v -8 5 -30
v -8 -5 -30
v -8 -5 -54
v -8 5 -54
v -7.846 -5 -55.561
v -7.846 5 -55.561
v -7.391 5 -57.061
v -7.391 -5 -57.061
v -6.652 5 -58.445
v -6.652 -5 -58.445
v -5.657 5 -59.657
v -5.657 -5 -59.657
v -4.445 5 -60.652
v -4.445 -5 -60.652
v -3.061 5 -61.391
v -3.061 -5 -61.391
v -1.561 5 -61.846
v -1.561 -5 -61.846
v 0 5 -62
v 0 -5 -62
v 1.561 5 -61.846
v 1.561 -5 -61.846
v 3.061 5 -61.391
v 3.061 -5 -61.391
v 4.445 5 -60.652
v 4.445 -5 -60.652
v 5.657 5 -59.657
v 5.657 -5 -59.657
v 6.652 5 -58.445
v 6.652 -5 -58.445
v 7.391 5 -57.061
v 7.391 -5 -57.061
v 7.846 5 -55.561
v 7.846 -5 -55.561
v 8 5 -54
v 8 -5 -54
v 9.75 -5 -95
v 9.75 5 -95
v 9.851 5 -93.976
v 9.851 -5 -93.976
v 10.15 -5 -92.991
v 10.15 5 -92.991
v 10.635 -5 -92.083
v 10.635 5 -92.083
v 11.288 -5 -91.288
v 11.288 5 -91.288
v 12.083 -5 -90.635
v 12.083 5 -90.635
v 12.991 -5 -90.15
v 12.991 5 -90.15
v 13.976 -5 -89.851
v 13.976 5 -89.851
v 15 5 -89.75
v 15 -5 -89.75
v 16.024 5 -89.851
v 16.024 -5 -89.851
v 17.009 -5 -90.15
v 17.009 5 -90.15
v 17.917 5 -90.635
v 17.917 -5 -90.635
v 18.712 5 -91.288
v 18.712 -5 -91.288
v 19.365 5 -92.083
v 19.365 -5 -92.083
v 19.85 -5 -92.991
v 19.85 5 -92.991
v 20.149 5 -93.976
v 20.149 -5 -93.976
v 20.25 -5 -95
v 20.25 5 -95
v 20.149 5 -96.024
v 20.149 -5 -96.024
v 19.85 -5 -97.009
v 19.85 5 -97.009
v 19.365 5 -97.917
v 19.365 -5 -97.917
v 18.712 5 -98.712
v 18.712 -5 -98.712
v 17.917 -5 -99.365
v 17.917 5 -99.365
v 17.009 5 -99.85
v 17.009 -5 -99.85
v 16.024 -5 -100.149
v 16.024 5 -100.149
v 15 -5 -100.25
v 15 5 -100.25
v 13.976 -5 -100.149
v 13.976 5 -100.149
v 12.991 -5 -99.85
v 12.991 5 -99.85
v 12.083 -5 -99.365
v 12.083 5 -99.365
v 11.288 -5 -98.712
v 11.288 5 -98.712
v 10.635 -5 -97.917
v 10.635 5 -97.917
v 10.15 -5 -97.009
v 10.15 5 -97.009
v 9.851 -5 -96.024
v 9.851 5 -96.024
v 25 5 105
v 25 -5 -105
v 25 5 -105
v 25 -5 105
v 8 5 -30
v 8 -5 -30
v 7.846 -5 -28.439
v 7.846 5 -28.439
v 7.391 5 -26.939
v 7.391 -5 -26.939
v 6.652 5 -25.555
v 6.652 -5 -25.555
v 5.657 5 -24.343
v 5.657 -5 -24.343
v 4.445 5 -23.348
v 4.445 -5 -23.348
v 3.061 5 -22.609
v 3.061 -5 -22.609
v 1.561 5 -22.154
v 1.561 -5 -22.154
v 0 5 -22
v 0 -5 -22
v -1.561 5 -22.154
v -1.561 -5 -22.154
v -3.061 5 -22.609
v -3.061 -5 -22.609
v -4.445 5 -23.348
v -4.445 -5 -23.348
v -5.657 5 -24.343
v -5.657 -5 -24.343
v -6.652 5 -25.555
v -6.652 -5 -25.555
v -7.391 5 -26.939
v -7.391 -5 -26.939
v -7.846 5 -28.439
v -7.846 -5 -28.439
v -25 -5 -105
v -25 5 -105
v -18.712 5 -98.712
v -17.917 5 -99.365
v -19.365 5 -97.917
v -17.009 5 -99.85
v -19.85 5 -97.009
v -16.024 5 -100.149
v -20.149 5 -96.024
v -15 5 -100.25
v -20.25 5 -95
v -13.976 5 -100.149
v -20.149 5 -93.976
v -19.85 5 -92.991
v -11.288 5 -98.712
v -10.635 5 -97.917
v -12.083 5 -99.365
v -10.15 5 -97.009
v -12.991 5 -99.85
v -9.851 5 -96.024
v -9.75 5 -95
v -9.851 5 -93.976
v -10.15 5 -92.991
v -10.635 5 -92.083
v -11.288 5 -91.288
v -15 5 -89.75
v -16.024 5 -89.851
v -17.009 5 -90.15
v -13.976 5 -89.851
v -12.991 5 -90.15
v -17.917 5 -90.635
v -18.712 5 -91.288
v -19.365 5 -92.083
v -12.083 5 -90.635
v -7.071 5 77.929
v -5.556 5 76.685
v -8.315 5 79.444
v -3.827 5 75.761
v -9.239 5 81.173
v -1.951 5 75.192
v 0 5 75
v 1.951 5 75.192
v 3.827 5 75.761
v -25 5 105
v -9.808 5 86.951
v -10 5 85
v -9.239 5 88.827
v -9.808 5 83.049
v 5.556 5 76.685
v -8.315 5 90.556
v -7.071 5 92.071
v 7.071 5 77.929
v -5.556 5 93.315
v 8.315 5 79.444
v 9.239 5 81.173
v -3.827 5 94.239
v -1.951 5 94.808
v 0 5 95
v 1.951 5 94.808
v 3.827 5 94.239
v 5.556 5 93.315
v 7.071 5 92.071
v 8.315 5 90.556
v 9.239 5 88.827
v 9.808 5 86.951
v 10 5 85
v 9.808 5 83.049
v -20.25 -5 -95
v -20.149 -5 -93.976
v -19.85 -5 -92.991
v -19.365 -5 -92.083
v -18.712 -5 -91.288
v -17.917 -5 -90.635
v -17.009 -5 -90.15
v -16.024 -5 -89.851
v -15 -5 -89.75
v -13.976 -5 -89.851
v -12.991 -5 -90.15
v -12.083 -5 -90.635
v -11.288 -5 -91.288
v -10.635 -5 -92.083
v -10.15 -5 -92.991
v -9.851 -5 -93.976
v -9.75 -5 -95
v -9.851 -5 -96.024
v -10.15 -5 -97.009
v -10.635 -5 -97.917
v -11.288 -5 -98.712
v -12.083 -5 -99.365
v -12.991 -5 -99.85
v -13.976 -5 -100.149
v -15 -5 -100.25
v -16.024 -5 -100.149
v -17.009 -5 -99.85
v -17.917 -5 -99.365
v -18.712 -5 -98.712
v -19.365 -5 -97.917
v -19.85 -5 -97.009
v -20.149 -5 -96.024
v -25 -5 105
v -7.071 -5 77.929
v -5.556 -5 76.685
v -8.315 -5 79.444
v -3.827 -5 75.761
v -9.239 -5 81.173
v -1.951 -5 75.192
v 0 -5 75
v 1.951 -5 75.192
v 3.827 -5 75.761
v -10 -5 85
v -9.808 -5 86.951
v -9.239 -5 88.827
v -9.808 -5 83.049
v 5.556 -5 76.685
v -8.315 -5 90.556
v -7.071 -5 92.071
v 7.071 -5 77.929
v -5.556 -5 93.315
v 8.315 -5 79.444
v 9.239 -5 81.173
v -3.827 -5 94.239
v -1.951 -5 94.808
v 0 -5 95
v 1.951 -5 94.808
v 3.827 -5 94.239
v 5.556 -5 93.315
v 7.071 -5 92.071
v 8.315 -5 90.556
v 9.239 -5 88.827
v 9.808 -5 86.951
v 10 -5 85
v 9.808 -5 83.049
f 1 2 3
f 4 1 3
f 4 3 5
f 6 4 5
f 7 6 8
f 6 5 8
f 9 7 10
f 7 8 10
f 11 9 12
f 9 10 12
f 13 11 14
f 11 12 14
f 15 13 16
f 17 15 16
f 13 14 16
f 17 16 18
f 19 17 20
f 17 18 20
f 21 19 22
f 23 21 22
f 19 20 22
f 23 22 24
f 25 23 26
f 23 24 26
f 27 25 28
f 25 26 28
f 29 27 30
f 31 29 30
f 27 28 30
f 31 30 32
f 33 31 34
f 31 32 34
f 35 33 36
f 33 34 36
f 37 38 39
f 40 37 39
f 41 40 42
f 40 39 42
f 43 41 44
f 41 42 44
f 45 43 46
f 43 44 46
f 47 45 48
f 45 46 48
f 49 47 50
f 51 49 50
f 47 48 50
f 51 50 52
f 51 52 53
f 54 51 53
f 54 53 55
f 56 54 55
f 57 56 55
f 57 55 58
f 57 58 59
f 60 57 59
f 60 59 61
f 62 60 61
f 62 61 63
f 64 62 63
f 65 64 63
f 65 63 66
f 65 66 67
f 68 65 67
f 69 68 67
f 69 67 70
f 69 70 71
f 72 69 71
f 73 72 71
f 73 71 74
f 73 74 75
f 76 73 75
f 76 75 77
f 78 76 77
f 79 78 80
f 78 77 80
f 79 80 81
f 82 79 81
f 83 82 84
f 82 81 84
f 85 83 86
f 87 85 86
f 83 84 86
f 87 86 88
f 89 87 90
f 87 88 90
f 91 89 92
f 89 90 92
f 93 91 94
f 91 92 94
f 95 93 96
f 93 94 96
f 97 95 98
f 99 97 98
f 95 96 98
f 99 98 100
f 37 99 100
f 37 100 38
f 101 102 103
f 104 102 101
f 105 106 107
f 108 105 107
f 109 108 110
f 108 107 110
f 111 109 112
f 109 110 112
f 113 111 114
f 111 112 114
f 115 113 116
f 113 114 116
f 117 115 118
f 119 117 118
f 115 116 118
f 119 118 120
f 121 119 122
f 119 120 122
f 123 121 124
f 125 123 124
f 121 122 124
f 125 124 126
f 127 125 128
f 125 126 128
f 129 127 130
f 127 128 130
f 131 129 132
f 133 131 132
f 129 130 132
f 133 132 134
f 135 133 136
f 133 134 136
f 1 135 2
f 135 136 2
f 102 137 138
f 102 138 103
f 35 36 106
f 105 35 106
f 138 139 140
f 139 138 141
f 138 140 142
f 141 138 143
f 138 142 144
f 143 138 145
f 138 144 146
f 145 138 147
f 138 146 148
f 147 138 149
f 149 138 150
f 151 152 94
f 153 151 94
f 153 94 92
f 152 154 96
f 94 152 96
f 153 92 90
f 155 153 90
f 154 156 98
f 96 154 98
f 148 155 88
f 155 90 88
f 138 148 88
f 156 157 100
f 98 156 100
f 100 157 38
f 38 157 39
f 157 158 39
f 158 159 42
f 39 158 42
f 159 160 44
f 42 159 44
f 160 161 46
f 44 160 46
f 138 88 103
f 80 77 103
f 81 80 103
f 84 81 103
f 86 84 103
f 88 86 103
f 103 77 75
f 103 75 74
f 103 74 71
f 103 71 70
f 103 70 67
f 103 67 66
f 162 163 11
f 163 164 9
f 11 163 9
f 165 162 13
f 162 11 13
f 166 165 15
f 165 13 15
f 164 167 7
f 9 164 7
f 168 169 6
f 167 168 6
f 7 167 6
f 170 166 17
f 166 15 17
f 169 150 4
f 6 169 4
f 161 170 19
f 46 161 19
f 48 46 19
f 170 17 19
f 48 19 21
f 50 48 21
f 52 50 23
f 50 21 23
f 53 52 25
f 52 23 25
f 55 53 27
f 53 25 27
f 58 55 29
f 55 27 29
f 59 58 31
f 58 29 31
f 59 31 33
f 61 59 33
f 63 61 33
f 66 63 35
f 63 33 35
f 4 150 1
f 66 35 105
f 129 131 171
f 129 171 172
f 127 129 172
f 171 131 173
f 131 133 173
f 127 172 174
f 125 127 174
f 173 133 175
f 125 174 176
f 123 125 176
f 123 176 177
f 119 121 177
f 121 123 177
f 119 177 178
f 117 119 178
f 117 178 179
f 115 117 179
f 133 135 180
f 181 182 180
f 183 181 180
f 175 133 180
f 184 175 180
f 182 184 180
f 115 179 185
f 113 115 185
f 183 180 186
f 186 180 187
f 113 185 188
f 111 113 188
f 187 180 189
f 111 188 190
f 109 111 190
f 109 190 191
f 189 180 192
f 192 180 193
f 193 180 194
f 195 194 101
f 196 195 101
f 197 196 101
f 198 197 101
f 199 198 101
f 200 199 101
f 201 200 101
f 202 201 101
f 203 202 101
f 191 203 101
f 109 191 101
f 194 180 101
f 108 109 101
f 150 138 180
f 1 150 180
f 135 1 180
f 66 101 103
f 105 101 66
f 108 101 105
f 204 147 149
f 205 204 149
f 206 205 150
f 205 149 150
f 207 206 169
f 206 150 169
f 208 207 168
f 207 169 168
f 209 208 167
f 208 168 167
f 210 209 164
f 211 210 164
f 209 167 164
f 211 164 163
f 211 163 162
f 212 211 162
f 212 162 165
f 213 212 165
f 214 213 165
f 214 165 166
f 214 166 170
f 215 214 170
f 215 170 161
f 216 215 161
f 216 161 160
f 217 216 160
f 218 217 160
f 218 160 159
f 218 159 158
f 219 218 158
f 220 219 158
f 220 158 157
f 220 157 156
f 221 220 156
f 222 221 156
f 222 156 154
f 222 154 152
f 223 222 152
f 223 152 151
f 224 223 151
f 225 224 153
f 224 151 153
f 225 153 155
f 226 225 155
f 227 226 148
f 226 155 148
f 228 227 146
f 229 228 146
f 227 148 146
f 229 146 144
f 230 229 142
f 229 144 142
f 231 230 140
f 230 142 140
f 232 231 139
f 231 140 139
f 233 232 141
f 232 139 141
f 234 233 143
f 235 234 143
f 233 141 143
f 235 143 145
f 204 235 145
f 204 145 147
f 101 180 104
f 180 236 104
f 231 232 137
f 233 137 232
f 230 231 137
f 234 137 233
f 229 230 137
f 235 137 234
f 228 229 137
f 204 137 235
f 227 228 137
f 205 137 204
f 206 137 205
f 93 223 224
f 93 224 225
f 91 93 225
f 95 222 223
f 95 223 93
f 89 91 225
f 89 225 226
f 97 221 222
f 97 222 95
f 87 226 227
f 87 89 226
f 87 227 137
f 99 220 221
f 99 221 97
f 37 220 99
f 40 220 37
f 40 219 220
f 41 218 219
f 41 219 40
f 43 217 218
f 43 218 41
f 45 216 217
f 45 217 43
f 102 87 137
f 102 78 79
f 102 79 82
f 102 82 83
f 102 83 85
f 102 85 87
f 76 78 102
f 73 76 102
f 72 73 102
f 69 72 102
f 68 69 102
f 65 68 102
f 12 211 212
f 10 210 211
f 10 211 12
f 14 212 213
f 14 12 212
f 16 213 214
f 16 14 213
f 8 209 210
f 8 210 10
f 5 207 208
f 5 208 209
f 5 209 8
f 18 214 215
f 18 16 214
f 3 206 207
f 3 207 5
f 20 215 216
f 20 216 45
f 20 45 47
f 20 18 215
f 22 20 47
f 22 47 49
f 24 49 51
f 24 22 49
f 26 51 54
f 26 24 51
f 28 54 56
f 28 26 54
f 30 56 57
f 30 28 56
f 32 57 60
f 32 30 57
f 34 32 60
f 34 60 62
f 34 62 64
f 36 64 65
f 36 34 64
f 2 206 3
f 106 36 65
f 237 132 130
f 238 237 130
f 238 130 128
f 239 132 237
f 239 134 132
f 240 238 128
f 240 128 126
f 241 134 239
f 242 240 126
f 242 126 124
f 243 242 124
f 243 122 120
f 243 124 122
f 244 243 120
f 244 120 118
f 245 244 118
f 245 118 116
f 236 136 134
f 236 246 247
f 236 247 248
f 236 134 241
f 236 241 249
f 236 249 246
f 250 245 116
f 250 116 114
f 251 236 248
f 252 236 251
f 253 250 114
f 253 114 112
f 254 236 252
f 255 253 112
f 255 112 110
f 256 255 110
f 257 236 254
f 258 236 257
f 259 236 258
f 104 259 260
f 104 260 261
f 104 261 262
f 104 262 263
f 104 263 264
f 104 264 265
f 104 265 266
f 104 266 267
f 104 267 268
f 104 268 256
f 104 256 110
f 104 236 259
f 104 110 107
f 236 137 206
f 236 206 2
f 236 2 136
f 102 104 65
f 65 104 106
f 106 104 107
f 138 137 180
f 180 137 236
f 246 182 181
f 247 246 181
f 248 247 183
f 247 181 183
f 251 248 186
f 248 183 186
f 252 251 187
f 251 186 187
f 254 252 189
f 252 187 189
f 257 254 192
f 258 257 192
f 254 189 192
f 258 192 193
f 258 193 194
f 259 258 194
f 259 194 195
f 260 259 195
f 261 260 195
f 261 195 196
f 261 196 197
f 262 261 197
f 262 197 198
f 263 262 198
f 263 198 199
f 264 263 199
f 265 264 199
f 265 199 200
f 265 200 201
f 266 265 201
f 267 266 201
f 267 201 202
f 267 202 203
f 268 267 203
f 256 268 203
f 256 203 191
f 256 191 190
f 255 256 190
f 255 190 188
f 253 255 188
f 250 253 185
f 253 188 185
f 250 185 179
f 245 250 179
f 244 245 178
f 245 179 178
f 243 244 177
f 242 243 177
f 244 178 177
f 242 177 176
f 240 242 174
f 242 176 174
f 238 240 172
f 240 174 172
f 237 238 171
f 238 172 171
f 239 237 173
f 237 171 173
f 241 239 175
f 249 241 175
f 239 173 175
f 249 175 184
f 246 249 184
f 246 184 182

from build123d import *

# Parameters (mm, degrees)
F0_W     = 50
F0_H     = 210
F1_DEPTH = 5
F3_D     = 20
F4_DEPTH = 10
F6_D     = 10.5


with BuildPart() as f1:
    # F0 (on Front) → F1 (new body, symmetric)
    with BuildSketch(Plane.XZ):
        Rectangle(F0_W, F0_H)
    extrude(amount=F1_DEPTH, both=True)

    # F3 (through all)
    with Locations(Plane.XZ.offset(5)):
        with Locations((0, 85)):
            Hole(F3_D / 2)

    # F2 (on face) → F4 (cut, through all)
    with BuildSketch(Plane.XZ.offset(5)):
        with BuildLine():
            Line((8, -54), (8, -30))
            ThreePointArc((8, -30), (0, -22), (-8, -30))
            Line((-8, -30), (-8, -54))
            ThreePointArc((-8, -54), (0, -62), (8, -54))
        make_face()
    extrude(amount=-F4_DEPTH, mode=Mode.SUBTRACT)

    # F6 (through all)
    with Locations(Plane.XZ.offset(5)):
        with Locations((-15, -95), (15, -95)):
            Hole(F6_D / 2)


solid = f1.part
